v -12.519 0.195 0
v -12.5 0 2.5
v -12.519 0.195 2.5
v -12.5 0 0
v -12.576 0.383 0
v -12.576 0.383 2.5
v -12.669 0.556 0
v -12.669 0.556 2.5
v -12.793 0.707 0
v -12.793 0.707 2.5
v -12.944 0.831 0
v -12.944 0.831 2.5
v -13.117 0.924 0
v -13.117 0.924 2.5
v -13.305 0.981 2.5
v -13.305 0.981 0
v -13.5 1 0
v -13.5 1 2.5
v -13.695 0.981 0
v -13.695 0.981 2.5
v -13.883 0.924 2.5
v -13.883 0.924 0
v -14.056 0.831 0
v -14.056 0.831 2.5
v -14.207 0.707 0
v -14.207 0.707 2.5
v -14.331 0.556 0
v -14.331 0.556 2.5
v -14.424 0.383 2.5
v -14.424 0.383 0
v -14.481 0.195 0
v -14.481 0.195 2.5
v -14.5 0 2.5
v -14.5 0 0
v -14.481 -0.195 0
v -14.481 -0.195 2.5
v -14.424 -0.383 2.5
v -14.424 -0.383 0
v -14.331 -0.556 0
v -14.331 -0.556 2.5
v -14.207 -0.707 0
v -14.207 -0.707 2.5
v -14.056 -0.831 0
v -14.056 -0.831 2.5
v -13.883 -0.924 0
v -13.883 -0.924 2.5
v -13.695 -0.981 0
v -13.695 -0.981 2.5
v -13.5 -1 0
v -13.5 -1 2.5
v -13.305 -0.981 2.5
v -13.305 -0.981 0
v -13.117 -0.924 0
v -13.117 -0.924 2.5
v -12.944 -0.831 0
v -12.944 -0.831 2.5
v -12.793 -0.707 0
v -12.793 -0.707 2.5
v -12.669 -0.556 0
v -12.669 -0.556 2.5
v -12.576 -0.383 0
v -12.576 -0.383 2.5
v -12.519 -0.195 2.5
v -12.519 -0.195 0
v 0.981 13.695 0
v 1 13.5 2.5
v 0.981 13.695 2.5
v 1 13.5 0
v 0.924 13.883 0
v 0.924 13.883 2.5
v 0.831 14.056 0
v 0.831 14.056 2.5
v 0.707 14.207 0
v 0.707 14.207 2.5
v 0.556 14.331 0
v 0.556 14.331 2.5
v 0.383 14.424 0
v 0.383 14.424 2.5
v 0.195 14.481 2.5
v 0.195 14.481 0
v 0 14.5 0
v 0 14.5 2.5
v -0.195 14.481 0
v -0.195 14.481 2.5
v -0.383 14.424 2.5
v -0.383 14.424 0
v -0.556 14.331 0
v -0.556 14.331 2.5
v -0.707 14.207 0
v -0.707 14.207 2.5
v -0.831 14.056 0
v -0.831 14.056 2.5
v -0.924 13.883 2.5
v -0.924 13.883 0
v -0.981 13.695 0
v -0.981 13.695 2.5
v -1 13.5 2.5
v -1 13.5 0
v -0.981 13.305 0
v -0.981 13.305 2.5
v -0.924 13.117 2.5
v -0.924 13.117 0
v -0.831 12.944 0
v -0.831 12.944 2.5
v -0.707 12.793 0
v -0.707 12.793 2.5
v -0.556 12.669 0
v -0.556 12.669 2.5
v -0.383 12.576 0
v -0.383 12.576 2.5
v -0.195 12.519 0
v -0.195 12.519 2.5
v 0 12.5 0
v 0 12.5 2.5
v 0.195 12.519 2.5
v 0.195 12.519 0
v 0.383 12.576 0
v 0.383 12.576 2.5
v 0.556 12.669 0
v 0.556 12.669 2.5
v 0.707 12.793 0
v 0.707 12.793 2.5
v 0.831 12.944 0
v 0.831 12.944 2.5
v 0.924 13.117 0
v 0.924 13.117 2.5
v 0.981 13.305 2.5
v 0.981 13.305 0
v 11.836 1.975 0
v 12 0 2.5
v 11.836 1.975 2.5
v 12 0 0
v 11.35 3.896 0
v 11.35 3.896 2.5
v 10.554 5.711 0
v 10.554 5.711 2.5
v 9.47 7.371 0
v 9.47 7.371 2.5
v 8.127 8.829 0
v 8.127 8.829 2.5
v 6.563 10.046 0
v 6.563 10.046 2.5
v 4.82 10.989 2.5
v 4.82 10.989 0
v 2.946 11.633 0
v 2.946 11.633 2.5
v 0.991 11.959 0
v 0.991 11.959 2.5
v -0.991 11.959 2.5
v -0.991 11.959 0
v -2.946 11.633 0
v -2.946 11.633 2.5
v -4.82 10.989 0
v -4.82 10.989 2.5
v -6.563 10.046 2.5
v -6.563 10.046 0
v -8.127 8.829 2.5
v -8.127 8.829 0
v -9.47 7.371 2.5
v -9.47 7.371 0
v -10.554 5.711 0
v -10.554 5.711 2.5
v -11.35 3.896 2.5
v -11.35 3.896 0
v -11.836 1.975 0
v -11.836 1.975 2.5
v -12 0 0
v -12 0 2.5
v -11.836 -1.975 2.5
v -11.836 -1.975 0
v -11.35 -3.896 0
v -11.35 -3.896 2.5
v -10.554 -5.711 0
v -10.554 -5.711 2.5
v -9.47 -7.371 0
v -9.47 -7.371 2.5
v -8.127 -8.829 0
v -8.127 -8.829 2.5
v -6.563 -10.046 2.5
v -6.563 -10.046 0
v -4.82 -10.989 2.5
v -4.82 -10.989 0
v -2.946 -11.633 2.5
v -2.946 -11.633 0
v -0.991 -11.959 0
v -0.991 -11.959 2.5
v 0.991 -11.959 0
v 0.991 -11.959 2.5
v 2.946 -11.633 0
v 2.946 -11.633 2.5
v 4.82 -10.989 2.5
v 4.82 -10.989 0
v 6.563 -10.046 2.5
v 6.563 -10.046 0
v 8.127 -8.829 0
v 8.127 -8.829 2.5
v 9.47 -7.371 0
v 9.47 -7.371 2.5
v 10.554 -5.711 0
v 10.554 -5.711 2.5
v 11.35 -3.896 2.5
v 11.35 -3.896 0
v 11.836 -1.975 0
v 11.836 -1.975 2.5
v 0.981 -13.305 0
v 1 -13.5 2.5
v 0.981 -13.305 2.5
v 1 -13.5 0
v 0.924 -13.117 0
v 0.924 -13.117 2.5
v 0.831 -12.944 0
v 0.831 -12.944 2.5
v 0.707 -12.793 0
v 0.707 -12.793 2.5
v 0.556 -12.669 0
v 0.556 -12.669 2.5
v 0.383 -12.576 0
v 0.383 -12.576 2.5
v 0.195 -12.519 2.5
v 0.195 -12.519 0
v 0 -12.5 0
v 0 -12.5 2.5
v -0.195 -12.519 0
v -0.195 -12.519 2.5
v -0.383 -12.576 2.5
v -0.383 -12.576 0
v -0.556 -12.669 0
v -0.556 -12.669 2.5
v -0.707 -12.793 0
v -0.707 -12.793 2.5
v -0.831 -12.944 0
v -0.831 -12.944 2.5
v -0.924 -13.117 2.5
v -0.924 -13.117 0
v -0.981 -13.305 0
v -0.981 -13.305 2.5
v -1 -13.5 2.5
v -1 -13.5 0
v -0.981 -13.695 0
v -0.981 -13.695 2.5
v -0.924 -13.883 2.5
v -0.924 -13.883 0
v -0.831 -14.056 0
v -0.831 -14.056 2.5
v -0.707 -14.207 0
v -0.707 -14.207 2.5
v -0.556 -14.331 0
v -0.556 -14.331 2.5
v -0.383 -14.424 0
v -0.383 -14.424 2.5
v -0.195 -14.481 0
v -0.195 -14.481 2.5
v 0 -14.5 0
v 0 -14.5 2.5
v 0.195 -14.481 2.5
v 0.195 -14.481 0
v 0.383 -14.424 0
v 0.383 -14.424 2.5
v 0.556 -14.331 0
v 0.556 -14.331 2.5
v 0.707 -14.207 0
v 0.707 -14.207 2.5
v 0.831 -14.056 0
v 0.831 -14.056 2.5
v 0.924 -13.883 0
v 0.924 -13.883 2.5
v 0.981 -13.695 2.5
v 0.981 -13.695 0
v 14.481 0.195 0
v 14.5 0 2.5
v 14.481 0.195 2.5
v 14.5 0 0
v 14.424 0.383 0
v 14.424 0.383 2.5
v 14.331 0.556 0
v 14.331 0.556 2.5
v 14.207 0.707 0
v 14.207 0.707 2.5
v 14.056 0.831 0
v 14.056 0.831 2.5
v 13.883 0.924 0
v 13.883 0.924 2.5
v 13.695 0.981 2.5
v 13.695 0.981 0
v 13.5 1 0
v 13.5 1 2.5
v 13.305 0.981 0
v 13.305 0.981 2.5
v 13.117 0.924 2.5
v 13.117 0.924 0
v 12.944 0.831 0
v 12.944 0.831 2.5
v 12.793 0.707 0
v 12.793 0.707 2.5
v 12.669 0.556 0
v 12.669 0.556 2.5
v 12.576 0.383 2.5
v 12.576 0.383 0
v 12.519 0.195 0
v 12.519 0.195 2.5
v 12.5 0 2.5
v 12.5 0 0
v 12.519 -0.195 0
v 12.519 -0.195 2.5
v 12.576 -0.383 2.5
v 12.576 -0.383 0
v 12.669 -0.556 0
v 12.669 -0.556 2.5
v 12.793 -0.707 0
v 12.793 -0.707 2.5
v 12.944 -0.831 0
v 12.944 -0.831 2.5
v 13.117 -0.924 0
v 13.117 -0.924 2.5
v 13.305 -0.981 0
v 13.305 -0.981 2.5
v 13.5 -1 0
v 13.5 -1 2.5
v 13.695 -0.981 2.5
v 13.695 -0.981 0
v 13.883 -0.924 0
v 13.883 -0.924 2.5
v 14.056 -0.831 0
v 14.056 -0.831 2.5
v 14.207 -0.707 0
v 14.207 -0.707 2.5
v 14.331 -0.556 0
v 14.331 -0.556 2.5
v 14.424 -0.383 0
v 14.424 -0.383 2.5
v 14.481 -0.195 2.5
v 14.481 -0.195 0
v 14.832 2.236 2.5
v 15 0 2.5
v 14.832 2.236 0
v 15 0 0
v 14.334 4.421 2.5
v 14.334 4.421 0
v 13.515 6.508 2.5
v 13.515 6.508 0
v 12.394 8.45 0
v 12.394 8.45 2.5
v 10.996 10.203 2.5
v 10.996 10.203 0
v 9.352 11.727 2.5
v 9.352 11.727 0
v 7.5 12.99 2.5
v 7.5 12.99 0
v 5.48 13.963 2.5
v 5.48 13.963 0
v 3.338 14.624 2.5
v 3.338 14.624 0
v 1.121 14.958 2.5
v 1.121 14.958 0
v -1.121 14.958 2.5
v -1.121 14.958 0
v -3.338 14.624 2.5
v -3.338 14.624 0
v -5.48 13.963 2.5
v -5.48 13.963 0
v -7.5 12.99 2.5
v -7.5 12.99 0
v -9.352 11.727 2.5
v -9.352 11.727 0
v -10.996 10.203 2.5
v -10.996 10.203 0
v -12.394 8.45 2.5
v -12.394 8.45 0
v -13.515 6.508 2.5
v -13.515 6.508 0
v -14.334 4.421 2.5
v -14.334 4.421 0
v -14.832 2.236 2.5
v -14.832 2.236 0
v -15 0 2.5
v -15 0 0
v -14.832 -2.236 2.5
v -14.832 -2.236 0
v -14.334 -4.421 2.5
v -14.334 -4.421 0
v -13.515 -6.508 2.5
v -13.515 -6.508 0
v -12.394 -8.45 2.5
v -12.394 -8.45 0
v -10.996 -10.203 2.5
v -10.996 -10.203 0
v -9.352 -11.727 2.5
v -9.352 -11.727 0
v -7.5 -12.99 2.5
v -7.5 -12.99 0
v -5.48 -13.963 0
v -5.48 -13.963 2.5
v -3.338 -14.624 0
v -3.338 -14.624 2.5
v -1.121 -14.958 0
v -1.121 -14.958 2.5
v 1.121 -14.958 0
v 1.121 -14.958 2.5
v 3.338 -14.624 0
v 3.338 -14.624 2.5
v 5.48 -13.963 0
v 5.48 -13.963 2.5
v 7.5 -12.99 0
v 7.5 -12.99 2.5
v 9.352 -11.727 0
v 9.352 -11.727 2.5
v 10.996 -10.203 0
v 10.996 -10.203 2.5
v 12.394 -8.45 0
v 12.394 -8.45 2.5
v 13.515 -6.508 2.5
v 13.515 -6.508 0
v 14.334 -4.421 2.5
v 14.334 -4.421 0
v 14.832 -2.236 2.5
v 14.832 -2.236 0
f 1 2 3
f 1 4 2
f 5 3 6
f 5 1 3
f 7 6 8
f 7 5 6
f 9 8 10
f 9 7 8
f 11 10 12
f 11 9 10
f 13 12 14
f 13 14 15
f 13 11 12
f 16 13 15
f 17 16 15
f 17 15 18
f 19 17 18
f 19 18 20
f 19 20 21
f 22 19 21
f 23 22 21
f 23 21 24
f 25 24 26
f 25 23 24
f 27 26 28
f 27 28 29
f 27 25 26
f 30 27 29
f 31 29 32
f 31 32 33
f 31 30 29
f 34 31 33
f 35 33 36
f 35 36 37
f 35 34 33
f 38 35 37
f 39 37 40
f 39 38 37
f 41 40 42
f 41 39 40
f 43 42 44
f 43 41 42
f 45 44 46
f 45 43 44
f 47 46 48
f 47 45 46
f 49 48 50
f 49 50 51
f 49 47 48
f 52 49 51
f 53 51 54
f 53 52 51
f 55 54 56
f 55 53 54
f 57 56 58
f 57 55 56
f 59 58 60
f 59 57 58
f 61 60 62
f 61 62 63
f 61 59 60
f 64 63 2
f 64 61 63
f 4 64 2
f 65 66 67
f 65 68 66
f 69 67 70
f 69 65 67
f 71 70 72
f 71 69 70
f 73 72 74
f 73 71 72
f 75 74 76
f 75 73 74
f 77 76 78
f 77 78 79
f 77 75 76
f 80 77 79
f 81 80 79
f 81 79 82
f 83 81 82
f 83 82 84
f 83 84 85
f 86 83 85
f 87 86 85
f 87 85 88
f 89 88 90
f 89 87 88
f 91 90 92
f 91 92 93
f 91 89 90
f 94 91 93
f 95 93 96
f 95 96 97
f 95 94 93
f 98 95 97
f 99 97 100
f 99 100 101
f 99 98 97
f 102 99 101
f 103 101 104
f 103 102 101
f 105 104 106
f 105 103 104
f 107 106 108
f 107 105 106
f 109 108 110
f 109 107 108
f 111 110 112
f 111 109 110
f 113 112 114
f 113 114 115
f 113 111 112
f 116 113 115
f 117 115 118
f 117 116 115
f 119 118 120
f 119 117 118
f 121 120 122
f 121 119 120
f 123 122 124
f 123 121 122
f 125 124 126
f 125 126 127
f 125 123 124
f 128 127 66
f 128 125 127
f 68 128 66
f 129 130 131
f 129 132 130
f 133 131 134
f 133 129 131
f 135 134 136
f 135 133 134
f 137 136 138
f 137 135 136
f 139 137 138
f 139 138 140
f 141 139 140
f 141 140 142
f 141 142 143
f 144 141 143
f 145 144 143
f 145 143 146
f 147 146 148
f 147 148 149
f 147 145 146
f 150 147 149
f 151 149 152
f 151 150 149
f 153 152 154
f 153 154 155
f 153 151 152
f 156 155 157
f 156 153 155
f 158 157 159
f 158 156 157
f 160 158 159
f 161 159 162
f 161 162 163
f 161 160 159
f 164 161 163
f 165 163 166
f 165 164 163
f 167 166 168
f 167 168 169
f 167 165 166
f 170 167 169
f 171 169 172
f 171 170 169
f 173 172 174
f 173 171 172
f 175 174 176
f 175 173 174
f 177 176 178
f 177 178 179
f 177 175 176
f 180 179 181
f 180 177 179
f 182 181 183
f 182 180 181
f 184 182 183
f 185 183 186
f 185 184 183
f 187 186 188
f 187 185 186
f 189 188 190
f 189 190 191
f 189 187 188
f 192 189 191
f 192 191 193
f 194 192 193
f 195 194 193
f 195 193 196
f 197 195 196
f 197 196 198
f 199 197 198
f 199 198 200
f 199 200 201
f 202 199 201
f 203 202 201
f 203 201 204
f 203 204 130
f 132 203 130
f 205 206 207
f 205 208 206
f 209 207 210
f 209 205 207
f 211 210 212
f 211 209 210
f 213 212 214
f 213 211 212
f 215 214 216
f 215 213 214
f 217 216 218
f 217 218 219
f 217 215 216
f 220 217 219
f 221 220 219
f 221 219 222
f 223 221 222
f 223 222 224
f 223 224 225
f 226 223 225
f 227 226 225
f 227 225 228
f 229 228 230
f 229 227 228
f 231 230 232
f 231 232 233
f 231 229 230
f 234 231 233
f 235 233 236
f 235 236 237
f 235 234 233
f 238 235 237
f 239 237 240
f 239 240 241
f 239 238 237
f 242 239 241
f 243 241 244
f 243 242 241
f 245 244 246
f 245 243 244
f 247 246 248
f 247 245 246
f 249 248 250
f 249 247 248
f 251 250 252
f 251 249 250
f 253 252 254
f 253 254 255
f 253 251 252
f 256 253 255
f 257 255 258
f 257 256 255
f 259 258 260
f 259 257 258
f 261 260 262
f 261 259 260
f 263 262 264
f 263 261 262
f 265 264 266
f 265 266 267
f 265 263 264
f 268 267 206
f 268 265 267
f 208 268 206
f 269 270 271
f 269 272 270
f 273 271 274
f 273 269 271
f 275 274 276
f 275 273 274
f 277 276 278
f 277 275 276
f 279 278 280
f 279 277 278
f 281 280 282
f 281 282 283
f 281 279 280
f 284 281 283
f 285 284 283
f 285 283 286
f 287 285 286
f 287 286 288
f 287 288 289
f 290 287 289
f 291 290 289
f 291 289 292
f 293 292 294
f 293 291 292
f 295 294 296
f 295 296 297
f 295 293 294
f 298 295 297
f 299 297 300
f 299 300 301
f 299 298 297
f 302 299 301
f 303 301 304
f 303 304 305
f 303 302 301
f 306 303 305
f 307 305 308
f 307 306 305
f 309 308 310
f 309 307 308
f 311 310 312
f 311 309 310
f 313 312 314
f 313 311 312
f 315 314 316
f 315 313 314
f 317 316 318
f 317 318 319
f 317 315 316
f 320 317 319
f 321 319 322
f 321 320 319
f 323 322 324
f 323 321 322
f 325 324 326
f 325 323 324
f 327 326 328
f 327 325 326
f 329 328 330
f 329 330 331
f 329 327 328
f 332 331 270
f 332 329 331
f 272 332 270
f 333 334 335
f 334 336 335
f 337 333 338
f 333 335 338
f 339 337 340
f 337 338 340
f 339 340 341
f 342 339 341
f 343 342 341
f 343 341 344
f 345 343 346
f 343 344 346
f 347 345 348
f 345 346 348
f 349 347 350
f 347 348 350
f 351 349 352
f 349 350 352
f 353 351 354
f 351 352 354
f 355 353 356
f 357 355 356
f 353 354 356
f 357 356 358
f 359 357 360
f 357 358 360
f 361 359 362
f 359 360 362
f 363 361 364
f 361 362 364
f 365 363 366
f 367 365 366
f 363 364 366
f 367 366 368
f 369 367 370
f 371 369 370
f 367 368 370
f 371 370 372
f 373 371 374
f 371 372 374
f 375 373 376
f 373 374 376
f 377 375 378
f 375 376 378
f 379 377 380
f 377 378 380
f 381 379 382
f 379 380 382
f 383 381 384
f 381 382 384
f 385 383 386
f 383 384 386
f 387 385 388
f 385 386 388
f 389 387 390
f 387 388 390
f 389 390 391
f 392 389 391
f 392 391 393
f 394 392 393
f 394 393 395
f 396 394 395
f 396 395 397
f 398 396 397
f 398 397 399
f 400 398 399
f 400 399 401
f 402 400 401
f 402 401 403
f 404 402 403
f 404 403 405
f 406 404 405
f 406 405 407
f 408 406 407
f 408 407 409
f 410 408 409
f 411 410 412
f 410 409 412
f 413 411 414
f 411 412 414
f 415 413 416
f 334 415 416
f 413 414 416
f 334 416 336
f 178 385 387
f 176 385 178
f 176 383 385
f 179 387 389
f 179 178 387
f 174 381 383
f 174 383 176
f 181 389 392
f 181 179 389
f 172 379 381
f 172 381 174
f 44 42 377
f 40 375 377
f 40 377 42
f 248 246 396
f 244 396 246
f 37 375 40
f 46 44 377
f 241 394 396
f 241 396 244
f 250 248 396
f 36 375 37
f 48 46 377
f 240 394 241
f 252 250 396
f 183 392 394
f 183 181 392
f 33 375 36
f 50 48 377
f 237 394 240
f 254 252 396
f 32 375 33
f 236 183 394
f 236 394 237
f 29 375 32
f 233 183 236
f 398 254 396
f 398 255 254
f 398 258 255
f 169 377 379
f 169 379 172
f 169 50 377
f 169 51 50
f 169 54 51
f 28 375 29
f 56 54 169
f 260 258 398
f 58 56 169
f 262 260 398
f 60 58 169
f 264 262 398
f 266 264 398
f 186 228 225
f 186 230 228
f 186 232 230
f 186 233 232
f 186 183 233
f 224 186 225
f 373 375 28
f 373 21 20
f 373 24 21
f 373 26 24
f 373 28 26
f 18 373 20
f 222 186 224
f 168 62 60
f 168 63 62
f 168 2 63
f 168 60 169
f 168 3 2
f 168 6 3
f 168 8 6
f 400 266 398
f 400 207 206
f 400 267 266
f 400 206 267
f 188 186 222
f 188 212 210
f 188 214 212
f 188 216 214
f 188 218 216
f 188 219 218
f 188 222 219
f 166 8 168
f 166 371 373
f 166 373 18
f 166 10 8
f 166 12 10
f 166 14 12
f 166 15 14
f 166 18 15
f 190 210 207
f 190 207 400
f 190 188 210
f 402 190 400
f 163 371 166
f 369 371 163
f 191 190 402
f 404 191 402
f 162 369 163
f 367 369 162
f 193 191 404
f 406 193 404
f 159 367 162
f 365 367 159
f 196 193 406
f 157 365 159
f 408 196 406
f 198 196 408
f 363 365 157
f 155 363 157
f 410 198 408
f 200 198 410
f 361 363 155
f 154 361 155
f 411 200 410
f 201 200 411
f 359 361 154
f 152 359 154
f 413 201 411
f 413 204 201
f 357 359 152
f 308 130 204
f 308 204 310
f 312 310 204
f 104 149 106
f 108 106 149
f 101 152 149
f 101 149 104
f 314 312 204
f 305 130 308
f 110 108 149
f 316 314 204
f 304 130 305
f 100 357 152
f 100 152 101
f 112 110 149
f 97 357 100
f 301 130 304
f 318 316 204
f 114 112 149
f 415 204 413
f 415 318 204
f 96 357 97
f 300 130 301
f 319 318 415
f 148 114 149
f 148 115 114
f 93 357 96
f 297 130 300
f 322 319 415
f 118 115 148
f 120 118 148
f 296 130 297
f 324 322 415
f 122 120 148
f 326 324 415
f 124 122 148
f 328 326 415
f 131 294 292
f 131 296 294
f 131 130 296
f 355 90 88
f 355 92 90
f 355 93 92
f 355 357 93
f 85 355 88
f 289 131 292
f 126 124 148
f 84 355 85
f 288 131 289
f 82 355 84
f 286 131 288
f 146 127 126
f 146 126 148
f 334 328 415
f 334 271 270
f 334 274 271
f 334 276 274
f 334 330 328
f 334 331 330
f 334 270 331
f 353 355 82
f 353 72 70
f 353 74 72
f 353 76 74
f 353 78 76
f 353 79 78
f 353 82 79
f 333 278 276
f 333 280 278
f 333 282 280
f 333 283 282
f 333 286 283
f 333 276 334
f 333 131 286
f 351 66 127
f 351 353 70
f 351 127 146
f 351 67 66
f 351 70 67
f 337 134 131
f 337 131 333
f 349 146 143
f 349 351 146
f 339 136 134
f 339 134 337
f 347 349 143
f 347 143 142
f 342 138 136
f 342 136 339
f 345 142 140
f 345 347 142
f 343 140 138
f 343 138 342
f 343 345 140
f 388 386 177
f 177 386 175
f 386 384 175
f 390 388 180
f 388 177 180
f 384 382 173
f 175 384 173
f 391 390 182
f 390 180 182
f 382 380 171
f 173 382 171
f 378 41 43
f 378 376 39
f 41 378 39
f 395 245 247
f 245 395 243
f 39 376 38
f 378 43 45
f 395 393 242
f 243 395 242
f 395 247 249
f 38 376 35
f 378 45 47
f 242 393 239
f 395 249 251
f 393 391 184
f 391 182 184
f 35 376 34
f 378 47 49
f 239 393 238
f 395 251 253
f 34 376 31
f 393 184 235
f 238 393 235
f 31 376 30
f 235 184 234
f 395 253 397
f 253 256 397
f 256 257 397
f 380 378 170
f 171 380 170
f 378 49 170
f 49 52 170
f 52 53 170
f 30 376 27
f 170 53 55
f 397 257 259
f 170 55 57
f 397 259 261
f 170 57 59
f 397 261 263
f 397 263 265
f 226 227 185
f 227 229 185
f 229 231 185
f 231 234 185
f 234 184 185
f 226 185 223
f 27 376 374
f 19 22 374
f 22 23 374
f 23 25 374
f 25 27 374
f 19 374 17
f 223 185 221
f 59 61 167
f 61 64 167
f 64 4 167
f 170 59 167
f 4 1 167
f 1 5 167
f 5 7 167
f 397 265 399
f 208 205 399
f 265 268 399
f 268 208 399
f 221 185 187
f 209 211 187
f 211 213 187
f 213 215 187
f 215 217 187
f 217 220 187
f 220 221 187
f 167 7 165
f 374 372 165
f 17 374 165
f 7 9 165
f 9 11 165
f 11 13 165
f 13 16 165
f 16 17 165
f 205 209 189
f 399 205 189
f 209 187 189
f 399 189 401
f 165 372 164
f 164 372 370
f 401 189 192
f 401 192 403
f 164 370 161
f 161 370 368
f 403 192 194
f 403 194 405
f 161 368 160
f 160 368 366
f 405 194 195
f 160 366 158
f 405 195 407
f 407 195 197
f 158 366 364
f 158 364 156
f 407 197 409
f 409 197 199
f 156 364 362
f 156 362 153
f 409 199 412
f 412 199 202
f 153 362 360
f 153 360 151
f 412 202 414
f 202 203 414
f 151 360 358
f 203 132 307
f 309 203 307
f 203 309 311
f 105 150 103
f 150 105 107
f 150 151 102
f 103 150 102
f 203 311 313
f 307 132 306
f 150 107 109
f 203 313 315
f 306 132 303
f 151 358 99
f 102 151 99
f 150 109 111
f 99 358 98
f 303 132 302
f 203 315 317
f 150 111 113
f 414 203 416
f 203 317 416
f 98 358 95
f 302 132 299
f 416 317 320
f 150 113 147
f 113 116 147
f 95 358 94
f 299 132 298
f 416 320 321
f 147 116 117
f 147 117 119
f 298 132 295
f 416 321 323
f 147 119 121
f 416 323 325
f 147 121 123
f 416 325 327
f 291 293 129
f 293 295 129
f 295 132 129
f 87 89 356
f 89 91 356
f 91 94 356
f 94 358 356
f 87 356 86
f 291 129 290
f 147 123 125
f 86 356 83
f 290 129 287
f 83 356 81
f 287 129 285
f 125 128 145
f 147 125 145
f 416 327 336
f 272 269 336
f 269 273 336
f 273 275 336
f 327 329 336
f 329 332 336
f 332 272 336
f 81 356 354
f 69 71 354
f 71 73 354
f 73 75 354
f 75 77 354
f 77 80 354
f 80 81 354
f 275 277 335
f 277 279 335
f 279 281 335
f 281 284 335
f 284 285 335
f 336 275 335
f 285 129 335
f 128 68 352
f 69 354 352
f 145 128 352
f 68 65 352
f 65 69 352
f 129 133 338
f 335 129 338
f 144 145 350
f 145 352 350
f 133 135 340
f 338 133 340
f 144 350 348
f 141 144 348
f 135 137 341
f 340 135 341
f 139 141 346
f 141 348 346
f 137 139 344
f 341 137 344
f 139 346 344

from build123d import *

# Parameters (mm, degrees)
SKETCH1_R           = 15
SKETCH1_R_2         = 12
SKETCH1_R_3         = 1
BOSS_EXTRUDE1_DEPTH = 1
SKETCH2_R           = 15
SKETCH2_R_2         = 12
SKETCH2_R_3         = 1
BOSS_EXTRUDE3_DEPTH = 1.5


with BuildPart() as part:
    # Sketch1 → Boss-Extrude1 (new body)
    with BuildSketch(Plane.XY):
        Circle(SKETCH1_R)
        Circle(SKETCH1_R_2, mode=Mode.SUBTRACT)
        with Locations((0, 13.5)):
            Circle(SKETCH1_R_3, mode=Mode.SUBTRACT)
        with Locations((13.5, 0)):
            Circle(SKETCH1_R_3, mode=Mode.SUBTRACT)
        with Locations((0, -13.5)):
            Circle(SKETCH1_R_3, mode=Mode.SUBTRACT)
        with Locations((-13.5, 0)):
            Circle(SKETCH1_R_3, mode=Mode.SUBTRACT)
    extrude(amount=BOSS_EXTRUDE1_DEPTH)

    # Sketch2 → Boss-Extrude3 (add)
    with BuildSketch(Plane.XY.offset(1)):
        Circle(SKETCH2_R)
        Circle(SKETCH2_R_2, mode=Mode.SUBTRACT)
        with Locations((0, 13.5)):
            Circle(SKETCH2_R_3, mode=Mode.SUBTRACT)
        with Locations((13.5, 0)):
            Circle(SKETCH2_R_3, mode=Mode.SUBTRACT)
        with Locations((0, -13.5)):
            Circle(SKETCH2_R_3, mode=Mode.SUBTRACT)
        with Locations((-13.5, 0)):
            Circle(SKETCH2_R_3, mode=Mode.SUBTRACT)
    extrude(amount=BOSS_EXTRUDE3_DEPTH)


solid = part.part
